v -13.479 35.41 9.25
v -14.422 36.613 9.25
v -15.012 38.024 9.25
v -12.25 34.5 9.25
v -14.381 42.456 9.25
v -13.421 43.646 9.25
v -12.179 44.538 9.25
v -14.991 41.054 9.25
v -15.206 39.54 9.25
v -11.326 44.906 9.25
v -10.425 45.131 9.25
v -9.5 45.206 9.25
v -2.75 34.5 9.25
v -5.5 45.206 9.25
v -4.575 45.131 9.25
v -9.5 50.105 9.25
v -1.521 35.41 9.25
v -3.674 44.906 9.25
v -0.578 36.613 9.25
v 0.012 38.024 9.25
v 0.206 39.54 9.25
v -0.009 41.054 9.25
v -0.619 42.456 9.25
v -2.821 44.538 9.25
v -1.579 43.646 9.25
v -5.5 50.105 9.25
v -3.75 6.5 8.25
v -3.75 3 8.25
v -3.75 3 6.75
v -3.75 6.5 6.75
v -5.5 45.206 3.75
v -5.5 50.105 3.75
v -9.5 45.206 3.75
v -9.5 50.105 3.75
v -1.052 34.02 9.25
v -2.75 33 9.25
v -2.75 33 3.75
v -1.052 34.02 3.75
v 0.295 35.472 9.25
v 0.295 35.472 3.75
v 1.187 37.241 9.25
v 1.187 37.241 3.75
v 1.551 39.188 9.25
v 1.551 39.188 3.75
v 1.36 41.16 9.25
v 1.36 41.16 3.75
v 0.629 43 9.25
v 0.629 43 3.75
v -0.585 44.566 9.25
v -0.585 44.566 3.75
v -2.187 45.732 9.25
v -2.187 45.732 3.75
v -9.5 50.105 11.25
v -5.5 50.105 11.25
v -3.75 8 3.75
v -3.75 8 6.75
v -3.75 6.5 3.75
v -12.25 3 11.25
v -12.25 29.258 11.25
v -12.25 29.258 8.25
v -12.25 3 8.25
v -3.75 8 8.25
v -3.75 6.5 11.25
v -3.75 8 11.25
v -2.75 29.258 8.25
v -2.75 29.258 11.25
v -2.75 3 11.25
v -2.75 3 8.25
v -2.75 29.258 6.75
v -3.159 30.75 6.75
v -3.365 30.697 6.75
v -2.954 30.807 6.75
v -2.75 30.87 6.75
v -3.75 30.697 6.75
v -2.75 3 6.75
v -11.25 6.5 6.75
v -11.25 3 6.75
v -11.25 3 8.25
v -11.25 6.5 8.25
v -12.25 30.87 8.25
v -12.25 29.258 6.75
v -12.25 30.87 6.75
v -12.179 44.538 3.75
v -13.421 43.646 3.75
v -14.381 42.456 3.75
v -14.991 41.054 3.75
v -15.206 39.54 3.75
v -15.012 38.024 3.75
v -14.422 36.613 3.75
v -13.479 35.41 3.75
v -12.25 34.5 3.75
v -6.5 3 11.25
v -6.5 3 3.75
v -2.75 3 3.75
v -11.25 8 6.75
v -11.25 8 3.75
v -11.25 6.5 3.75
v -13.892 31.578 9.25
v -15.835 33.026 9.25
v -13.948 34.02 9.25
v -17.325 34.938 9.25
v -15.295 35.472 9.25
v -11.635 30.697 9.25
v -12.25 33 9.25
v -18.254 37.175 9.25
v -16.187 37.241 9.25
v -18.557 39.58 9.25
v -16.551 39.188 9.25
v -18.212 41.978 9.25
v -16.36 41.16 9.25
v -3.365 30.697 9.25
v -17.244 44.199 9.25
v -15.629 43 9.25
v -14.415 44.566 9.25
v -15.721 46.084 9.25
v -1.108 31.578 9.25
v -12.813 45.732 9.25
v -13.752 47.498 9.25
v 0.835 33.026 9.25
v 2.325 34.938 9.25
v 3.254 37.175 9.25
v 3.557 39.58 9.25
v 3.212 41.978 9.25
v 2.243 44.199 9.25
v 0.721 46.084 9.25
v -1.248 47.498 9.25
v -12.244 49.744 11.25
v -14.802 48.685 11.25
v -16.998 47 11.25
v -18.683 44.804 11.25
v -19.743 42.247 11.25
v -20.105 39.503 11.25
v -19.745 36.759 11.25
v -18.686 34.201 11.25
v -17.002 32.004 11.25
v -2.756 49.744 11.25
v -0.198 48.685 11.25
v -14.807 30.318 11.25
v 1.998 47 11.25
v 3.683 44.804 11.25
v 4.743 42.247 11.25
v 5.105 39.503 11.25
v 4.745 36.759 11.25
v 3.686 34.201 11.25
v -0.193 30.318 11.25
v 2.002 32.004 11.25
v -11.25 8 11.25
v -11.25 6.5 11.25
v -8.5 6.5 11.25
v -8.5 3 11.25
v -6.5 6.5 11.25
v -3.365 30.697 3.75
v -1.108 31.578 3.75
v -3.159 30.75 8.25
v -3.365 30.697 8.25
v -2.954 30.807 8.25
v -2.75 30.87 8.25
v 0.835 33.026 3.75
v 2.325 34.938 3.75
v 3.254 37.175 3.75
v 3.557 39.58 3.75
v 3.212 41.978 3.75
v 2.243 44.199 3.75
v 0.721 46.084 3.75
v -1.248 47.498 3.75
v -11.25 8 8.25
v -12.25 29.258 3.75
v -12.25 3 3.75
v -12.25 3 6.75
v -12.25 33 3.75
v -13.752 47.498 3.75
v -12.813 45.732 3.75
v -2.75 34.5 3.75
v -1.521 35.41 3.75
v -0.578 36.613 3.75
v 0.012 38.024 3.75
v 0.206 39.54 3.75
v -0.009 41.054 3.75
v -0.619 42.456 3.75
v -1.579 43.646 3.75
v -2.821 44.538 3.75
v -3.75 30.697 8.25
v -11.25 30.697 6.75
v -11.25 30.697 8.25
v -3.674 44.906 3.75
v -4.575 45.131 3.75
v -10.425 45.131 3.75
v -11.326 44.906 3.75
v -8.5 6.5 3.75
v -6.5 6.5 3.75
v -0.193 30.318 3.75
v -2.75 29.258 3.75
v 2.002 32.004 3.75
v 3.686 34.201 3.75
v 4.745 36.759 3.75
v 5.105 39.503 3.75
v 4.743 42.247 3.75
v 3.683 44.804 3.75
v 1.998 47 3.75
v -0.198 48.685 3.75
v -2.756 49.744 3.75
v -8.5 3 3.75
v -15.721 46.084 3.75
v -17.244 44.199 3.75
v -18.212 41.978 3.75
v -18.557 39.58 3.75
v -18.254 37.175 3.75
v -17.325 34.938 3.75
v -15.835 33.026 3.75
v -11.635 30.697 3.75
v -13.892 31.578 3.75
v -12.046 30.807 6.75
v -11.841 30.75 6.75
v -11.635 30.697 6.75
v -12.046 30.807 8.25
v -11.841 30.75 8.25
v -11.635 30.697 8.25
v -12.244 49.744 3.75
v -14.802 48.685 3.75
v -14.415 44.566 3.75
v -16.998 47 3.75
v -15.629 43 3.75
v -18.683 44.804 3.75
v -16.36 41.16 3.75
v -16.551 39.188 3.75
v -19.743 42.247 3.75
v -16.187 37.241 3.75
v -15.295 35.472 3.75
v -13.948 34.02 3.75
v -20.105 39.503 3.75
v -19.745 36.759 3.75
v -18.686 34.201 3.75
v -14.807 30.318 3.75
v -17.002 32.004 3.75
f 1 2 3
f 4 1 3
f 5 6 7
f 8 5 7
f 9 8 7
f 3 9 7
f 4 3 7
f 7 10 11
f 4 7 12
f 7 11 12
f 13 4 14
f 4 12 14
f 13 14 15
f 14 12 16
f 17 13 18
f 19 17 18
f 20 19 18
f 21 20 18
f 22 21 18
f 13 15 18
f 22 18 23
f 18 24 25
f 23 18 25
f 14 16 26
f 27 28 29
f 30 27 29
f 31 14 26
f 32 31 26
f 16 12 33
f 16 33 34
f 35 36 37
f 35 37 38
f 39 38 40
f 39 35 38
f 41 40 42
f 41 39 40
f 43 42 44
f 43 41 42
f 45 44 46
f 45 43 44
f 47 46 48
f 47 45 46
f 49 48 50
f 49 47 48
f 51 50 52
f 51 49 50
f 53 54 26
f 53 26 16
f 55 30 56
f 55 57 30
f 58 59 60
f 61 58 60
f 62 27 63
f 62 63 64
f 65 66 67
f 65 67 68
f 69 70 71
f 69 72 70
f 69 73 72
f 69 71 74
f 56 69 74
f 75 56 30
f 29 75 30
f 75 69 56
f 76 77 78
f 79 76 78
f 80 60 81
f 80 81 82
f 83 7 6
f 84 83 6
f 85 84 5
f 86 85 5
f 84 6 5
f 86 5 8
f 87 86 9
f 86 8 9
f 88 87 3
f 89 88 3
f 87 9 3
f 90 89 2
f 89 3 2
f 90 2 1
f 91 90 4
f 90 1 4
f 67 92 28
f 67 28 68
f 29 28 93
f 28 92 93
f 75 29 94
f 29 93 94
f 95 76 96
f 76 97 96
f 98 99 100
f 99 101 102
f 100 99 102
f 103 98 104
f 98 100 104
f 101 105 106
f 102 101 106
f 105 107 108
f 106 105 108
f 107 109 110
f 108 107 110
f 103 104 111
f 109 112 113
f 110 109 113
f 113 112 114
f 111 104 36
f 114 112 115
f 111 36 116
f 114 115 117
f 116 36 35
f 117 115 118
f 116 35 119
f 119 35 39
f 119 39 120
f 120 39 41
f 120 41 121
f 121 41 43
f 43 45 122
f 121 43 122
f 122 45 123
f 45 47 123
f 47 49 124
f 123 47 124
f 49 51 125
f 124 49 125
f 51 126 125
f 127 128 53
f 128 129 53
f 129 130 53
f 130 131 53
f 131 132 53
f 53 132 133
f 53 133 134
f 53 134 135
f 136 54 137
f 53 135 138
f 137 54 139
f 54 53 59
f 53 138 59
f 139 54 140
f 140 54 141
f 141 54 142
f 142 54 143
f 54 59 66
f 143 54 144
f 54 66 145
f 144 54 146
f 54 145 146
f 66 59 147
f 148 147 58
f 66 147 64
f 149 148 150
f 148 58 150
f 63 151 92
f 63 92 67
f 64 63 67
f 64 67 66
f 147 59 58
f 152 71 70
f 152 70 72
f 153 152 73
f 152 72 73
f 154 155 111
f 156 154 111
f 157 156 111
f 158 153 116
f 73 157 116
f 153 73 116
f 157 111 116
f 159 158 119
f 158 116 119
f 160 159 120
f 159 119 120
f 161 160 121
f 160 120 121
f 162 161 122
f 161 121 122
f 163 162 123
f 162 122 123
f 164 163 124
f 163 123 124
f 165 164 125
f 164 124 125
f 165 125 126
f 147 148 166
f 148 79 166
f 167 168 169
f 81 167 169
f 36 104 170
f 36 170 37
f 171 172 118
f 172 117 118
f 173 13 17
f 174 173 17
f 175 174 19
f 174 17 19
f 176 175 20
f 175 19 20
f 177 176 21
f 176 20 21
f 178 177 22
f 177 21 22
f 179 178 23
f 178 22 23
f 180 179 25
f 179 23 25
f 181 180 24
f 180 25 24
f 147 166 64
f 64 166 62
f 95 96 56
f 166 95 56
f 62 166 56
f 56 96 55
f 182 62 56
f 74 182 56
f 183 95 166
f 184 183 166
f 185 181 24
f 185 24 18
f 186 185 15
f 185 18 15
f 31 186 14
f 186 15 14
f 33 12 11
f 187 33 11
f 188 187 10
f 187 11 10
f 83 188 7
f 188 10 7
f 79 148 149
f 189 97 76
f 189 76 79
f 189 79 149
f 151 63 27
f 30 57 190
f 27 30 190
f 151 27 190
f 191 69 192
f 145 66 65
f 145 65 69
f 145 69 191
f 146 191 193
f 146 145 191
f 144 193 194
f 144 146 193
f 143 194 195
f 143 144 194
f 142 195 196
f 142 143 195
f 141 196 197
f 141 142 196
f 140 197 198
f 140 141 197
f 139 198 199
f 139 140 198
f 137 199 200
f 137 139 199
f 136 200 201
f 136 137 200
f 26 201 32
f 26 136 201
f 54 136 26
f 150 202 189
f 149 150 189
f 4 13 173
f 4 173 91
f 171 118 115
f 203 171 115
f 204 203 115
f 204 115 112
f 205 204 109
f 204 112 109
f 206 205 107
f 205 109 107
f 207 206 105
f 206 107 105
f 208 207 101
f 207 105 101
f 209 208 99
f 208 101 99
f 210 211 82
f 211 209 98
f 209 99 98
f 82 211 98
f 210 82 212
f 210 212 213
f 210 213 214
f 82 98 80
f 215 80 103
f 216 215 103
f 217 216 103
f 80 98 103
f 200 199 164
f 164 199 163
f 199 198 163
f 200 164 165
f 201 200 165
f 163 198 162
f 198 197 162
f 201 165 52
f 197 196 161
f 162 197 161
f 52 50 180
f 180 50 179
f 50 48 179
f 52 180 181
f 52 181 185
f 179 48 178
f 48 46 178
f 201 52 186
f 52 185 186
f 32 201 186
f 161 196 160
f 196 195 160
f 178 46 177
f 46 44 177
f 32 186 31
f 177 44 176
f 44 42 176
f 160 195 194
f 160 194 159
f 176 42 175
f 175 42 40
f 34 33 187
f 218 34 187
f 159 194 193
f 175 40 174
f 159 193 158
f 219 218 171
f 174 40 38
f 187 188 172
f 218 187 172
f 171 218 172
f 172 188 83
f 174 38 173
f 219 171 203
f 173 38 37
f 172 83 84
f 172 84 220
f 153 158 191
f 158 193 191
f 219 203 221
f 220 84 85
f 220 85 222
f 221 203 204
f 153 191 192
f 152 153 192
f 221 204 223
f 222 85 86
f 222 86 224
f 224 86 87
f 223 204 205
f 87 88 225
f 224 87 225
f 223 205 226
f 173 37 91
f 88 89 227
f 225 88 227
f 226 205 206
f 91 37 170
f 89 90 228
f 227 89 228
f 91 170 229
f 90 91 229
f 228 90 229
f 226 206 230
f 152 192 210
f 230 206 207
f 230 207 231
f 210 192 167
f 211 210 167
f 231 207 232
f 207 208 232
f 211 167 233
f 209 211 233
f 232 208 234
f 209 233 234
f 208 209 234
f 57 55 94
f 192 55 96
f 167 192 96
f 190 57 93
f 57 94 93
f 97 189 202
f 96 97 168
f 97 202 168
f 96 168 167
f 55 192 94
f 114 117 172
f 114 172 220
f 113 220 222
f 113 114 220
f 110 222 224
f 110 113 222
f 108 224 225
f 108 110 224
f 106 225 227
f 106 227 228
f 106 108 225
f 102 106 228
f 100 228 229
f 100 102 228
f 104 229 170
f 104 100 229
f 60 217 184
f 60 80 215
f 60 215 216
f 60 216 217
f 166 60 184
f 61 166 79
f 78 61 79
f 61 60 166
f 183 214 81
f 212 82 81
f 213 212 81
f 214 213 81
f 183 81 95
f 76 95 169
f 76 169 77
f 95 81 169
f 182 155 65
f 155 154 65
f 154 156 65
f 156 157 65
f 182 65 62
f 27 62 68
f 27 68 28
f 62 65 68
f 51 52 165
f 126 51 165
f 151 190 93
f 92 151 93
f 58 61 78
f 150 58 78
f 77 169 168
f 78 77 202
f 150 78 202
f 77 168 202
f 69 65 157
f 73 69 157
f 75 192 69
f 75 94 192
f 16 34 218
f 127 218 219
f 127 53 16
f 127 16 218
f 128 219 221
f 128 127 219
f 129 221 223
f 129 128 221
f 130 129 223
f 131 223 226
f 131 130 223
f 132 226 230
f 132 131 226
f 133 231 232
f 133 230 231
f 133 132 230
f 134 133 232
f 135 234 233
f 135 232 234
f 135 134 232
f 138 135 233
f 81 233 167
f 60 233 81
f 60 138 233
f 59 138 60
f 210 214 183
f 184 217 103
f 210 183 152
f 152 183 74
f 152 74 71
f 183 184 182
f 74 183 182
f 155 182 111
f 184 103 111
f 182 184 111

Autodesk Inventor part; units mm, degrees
ref_plane "YZ Plane" through (0, 0, 0) normal (1, 0, 0) x (0, 1, 0)
ref_plane "XZ Plane" through (0, 0, 0) normal (0, 1, 0) x (-1, 0, 0)
ref_plane "XY Plane" through (0, 0, 0) normal (0, 0, 1) x (1, 0, 0)
ref_plane "Work Plane1" through (0, 3, 0) normal (0, 1, 0) x (1, 0, 0)
sketch "Sketch2" plane through (0, 3, 0) normal (0, 1, 0) x (1, 0, 0)
  line L0 (-11.25, -11.25) -> (-3.75, -11.25)
  line L1 (-3.75, -11.25) -> (-3.75, -3.75)
  line L2 (-3.75, -3.75) -> (-11.25, -3.75)
  line L3 (-11.25, -3.75) -> (-11.25, -11.25)
  line L4 (0, -15) -> (0, 0) projected
  line L5 (0, 0) -> (-15, 0) projected
  line L6 (-3.75, -11.25) -> (-2.75, -11.25)
  line L7 (-2.75, -11.25) -> (-2.75, -8.25)
  line L8 (-2.75, -8.25) -> (-3.75, -8.25)
  line L9 (-3.75, -8.25) -> (-3.75, -11.25)
  line L10 (-14.1659, -7.5) -> (-0.7229, -7.5) construction
  line L11 (-7.5, -11.25) -> (-7.5, -3.75) construction
  line L12 (-3.75, -3.75) -> (-2.75, -3.75)
  line L13 (-2.75, -3.75) -> (-2.75, -6.75)
  line L14 (-2.75, -6.75) -> (-3.75, -6.75)
  line L15 (-11.25, -11.25) -> (-12.25, -11.25)
  line L16 (-12.25, -11.25) -> (-12.25, -8.25)
  line L17 (-12.25, -8.25) -> (-11.25, -8.25)
  line L18 (-0.8341, -7.5) -> (-14.2771, -7.5) construction
  line L19 (-12.25, -3.75) -> (-12.25, -6.75)
  line L20 (-11.25, -3.75) -> (-12.25, -3.75)
  line L21 (-12.25, -6.75) -> (-11.25, -6.75)
  dimension "d4" = 7.5
  dimension "d5" = 7.5
  dimension "d6" = 3.75
  dimension "d7" = 3.75
  dimension "d8" = 3
  dimension "d9" = 1
extrude "Extrusion2" add sketch "Sketch2" along normal blind 30
ref_plane "Work Plane2" through (-12.25, 3, 11.25) normal (0, 0, 1) x (1, 0, 0)
sketch "Sketch3" plane through (-12.25, 3, 11.25) normal (0, 0, 1) x (1, 0, 0)
  line L0 (0, 30) -> (9.5, 30) projected
  line L1 (9.5, 30) -> (0, 30) projected
  line L2 (4.75, 30) -> (4.75, 36.5)
  line L3 (4.75, 36.5) -> (2.75, 36.5)
  arc A0 (2.75, 43.5578) -> (0, 30) centre (2.75, 36.5) ccw
  line L4 (0, 0) -> (0, 30) projected
  line L5 (0, 30) -> (0, 31.5)
  arc A1 (0.071, 41.5384) -> (0, 31.5) centre (2.75, 36.5) ccw
  line L6 (9.5, 0) -> (9.5, 30) projected
  line L7 (9.5, 30) -> (9.5, 31.5)
  line L8 (0.071, 41.5384) -> (-0.5634, 42.7317)
  line L9 (-0.5634, 42.7317) -> (-1.5024, 44.4976)
  arc A2 (-1.5024, 44.4976) -> (0.615, 27.6974) centre (2.75, 36.5) ccw
  arc A3 (3.4191, 47.0839) -> (0.6661, 26.1017) centre (2.75, 36.5) ccw
  line L10 (0, 30) -> (9.5, 30)
  line L11 (9.5, 31.5) -> (0, 31.5)
  line L12 (0.615, 27.6974) -> (8.885, 27.6974)
  line L13 (9.2653, 26.1017) -> (0.6661, 26.1017)
  line L14 (4.75, 36.5) -> (4.75, 49.394)
  line L15 (-1.5024, 44.4976) -> (-2.2288, 45.8637)
  arc A4 (2.75, 42.2064) -> (0.071, 41.5384) centre (2.75, 36.5) ccw
  line L16 (2.75, 42.2064) -> (2.75, 47.105)
  line L17 (4.75, 49.394) -> (4.75, 23.6593)
  line L18 (4.75, 36.5) -> (6.75, 36.5)
  arc A5 (9.5, 30) -> (6.75, 43.5578) centre (6.75, 36.5) ccw
  line L19 (9.5, 30) -> (9.5, 31.5)
  arc A6 (9.5, 31.5) -> (9.429, 41.5384) centre (6.75, 36.5) ccw
  line L20 (9.429, 41.5384) -> (10.0634, 42.7317)
  line L21 (10.0634, 42.7317) -> (11.0024, 44.4976)
  arc A7 (8.885, 27.6974) -> (11.0024, 44.4976) centre (6.75, 36.5) ccw
  arc A8 (8.8339, 26.1017) -> (6.0809, 47.0839) centre (6.75, 36.5) ccw
  line L22 (11.0024, 44.4976) -> (11.7288, 45.8637)
  arc A9 (9.429, 41.5384) -> (6.75, 42.2064) centre (6.75, 36.5) ccw
  line L23 (6.75, 42.2064) -> (6.75, 47.105)
  line L24 (6.75, 47.105) -> (2.75, 47.105)
  line L25 (2.75, 42.2064) -> (6.75, 42.2064)
  point P0 (12.25, -3)
  point P1 (0, 27.8698)
  point P2 (4.75, 42.947)
  point P3 (9.5, 27.8698)
  point P4 (0, 26.2577)
  point P5 (9.5, 26.2577)
  dimension "d28" = 6.5
  dimension "d29" = 2
  dimension "d31" = 1.5
  dimension "d33" = 2
  dimension "d34" = 1.3514
  dimension "d59" = 28
  dimension "d60" = 1.5473
extrude "Extrusion5" add sketch "Sketch3" against normal blind 7.5 contours L5 L11 L2 L0 | A0 L8 A1 L5 | L2 L11 L7 L0 | L9 L15 A3 L16 A0 | A0 L16 A4 L8 | L4 A3 L15 A2 | L7 A6 L20 A5 | A7 L22 A8 L6 | L20 A9 L23 A5 | A5 L23 A8 L22 L21
extrude "Extrusion6" cut sketch "Sketch3" against normal blind 7.5 contours L0 L17 L12 A2 L4 | L0 L6 A7 L12 L17
sketch "Sketch4" plane through (-2.75, 3, 3.75) normal (0, 0, -1) x (-1, 0, 0)
  line L0 (9.5, 0) -> (0, 0) projected
  line L1 (3.75, 0) -> (5.75, 0)
  line L2 (5.75, 0) -> (5.75, 5)
  line L3 (5.75, 5) -> (3.75, 5)
  line L4 (3.75, 5) -> (3.75, 0)
  line L5 (9.5, 0) -> (9.5, 26.2577) projected
  line L6 (1, 0) -> (1, 27.6974) projected
  line L7 (3.75, 5) -> (1, 5)
  line L8 (1, 3.5) -> (3.75, 3.5)
  line L9 (3.75, 3.5) -> (3.75, 5)
  line L10 (4.75, 0) -> (4.75, 5)
  line L11 (0, 0) -> (9.5, 0)
  line L12 (5.75, 0) -> (3.75, 0)
  line L13 (3.75, 5) -> (5.75, 5)
  line L14 (5.75, 5) -> (5.75, 0)
  line L15 (5.75, 5) -> (8.5, 5)
  line L16 (8.5, 3.5) -> (5.75, 3.5)
  line L17 (5.75, 3.5) -> (5.75, 5)
  line L18 (1, 3.5) -> (1, 5)
  line L19 (8.5, 3.5) -> (8.5, 5)
  point P0 (-2.75, -3)
  point P1 (5.75, 0)
  point P2 (5.75, 3.5)
  point P3 (3.75, 3.5)
  dimension "d62" = 2
  dimension "d63" = 4.75
  dimension "d64" = 5
  dimension "d65" = 1.5
extrude "Extrusion7" cut sketch "Sketch4" against normal through all contours L0 L10 L3 L2 | L0 L4 L3 L10 | L2 L15 L19 L16 | L8 L6 L7 L4
extrude "Extrusion8" add sketch "Sketch3" against normal blind 2 contours L4 A2 L9 A0 | L0 L17 L12 A2 L4 | L0 L6 A7 L12 L17 | A1 A4 L25 L14 L2 L11 | A5 L21 A7 L6 | L2 L14 L25 A9 A6 L11 | L16 L24 L14 L25 | L23 L25 L14 L24
properties part number "SlangHållare"
